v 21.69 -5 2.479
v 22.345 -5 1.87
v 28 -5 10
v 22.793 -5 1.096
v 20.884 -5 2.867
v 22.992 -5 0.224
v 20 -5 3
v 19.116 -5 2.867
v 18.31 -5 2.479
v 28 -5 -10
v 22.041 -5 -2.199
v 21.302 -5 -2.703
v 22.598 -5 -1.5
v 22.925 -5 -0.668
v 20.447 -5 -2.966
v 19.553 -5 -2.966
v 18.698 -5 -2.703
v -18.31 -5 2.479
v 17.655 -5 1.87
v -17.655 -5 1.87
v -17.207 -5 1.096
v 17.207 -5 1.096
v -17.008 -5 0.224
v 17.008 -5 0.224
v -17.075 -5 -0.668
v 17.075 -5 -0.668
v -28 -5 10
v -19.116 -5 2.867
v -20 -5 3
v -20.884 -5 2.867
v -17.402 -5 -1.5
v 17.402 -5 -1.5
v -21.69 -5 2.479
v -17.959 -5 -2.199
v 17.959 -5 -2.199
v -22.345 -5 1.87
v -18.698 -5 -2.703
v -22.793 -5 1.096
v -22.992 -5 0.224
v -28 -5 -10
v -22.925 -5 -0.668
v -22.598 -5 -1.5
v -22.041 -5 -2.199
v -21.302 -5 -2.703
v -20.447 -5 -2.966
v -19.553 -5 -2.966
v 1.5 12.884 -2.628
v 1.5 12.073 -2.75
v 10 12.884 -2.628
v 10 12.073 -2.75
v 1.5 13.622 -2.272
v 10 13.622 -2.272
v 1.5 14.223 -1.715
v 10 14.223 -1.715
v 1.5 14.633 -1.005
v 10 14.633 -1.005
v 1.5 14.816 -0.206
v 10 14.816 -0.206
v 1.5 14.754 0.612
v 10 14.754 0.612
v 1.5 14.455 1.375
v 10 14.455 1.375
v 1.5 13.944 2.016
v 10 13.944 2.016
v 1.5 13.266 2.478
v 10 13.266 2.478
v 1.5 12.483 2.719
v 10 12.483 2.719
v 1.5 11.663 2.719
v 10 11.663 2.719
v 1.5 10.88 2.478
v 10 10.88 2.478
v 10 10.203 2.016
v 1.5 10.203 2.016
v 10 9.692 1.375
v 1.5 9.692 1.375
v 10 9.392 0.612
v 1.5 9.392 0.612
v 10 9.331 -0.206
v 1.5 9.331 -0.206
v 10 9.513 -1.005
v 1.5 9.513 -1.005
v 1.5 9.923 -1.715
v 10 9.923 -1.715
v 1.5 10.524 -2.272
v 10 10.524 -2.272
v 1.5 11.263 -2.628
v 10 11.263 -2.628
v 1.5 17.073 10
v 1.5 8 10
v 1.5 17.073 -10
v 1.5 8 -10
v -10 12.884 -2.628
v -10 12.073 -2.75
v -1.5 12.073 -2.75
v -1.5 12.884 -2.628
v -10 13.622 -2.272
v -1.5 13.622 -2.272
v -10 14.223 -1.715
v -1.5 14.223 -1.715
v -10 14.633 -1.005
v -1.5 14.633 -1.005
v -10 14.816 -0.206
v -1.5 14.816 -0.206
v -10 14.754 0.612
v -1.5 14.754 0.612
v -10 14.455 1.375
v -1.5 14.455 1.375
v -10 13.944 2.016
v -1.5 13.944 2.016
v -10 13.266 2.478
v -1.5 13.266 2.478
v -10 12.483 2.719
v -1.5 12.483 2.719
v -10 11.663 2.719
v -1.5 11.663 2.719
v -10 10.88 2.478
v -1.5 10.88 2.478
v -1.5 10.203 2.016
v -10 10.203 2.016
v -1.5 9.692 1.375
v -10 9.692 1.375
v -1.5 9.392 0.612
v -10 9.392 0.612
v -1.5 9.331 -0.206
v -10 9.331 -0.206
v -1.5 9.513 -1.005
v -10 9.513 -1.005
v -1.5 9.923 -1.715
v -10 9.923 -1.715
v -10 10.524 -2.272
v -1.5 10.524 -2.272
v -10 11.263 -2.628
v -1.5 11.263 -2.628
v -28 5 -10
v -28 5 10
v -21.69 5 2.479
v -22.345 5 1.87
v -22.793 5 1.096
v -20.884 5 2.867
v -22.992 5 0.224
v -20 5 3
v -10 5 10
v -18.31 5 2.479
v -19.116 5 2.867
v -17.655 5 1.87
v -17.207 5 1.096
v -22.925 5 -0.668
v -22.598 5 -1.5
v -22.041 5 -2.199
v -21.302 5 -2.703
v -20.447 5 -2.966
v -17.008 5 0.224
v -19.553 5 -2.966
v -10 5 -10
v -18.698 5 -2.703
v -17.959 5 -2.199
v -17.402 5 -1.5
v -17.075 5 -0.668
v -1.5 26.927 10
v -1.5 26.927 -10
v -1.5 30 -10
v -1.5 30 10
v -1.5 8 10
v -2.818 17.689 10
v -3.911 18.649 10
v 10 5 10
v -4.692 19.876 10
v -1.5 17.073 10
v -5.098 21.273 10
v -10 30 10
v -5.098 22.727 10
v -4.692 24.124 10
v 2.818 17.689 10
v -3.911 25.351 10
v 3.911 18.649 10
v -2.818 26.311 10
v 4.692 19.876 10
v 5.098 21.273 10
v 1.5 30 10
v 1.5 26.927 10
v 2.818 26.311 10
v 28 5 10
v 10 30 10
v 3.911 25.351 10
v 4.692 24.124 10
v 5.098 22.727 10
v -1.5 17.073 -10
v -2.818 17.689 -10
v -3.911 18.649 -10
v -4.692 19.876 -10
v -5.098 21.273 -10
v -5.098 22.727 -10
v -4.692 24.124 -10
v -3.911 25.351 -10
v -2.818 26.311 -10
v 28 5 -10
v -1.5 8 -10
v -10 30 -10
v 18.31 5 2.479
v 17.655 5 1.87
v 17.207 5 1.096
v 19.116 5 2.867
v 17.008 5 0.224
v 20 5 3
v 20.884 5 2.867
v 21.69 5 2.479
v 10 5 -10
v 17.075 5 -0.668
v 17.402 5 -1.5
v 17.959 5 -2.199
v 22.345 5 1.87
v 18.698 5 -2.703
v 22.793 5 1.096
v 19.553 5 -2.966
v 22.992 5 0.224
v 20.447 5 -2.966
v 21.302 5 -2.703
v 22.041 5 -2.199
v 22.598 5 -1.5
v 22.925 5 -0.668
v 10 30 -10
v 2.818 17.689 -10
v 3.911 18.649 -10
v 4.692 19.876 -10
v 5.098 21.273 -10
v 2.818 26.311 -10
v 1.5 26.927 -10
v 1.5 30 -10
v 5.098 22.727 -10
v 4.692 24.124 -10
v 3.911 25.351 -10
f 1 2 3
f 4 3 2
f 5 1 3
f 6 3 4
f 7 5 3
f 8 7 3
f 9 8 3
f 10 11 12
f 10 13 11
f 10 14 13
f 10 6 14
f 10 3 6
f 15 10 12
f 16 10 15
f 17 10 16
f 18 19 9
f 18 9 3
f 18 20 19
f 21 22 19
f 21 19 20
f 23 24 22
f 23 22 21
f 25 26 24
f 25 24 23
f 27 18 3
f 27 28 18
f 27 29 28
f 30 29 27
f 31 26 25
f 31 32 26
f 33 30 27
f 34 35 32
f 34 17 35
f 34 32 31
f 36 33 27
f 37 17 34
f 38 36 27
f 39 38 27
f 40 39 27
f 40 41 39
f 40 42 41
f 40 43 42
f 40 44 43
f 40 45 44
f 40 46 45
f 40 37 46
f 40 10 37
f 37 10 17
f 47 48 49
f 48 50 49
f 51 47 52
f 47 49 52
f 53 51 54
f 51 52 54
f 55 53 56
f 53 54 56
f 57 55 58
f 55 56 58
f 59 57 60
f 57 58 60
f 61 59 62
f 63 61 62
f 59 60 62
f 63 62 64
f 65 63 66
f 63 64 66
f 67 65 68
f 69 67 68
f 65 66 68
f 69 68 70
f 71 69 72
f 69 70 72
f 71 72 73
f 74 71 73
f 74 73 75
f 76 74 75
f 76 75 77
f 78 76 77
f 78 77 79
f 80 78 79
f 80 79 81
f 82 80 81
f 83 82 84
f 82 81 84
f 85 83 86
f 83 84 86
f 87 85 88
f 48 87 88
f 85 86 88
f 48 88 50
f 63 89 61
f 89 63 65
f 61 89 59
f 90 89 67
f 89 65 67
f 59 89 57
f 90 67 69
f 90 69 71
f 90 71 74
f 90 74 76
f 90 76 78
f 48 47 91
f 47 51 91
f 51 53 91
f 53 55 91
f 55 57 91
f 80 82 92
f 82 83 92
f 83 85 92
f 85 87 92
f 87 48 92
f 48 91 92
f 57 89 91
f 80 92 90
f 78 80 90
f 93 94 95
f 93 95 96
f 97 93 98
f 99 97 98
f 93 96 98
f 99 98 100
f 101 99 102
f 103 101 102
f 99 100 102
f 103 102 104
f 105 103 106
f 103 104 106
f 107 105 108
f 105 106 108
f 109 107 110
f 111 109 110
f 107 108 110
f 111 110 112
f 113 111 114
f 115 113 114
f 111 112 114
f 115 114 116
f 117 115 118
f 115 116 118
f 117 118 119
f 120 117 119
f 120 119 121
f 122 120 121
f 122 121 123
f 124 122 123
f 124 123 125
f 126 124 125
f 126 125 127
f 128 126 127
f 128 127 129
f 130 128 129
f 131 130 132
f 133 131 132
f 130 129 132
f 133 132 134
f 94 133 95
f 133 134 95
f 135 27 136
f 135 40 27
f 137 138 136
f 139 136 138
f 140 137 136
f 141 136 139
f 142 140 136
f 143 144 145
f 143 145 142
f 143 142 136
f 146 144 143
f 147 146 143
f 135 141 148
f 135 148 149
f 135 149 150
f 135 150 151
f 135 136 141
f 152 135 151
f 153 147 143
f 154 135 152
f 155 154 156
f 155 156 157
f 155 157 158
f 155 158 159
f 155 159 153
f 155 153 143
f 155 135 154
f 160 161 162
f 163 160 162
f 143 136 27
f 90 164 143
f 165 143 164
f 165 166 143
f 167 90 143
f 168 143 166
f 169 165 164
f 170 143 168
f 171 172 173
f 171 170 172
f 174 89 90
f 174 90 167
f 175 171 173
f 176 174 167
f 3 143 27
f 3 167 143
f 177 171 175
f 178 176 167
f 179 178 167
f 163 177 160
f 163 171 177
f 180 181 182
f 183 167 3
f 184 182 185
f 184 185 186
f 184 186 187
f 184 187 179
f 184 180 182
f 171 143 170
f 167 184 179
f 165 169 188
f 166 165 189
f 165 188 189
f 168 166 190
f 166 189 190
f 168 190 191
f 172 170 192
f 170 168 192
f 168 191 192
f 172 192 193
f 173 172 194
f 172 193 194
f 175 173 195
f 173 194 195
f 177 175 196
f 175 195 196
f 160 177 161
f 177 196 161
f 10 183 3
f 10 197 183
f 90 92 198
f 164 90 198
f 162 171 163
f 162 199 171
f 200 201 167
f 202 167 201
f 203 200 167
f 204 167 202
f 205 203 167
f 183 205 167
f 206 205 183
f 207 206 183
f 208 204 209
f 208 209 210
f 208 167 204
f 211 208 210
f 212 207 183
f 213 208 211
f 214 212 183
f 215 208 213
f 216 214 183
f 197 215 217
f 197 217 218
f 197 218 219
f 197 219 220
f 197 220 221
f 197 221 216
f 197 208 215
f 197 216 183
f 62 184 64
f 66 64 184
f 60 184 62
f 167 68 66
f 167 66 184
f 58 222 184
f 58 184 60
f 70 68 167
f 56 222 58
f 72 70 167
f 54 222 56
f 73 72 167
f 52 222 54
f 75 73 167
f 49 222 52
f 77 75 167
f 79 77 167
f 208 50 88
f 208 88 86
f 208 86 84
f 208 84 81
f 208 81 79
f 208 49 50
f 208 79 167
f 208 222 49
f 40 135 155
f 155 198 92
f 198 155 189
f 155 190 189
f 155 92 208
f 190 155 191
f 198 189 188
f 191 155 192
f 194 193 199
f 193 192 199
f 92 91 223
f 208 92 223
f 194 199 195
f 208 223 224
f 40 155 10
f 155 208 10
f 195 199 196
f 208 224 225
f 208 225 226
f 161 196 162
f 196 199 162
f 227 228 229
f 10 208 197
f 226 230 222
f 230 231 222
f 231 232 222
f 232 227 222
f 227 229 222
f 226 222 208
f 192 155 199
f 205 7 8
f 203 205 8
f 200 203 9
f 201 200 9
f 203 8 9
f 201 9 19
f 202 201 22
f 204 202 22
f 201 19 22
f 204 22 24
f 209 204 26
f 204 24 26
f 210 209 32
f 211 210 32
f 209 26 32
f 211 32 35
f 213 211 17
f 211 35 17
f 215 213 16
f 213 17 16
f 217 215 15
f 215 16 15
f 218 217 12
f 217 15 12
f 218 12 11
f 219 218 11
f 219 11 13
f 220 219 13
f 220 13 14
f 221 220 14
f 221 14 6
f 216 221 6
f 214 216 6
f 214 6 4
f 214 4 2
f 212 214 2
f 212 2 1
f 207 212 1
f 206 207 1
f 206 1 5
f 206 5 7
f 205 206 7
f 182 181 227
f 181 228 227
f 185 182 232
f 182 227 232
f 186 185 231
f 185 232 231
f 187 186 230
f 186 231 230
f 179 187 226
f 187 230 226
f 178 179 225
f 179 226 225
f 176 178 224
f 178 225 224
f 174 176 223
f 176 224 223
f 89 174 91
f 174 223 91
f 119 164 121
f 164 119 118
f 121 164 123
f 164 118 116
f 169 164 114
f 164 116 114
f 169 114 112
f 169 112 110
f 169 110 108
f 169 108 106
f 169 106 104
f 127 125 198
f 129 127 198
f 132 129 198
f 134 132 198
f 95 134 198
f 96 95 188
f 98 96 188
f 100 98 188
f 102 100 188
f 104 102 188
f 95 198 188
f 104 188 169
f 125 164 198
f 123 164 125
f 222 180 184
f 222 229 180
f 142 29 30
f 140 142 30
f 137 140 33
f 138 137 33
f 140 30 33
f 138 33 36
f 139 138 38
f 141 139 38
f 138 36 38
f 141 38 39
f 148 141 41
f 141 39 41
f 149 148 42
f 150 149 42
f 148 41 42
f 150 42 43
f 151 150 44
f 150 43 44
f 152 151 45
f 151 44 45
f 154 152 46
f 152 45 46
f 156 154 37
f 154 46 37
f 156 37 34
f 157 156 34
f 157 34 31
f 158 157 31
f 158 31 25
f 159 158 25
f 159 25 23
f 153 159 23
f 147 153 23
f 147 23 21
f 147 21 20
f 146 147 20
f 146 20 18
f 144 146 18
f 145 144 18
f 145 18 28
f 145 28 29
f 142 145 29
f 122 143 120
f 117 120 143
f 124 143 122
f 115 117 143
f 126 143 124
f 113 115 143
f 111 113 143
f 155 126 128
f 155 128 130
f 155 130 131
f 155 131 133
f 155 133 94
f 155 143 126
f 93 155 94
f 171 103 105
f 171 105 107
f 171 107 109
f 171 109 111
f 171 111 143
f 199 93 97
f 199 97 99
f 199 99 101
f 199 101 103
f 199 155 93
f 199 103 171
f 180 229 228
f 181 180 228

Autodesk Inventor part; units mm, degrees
ref_plane "YZ Plane" through (0, 0, 0) normal (1, 0, 0) x (0, 1, 0)
ref_plane "XZ Plane" through (0, 0, 0) normal (0, 1, 0) x (-1, 0, 0)
ref_plane "XY Plane" through (0, 0, 0) normal (0, 0, 1) x (1, 0, 0)
sketch "Sketch1" plane through (0, 0, 0) normal (0, 0, 1) x (1, 0, 0)
  line L0 (-28, 5) -> (28, 5)
  line L1 (28, 5) -> (28, -5)
  line L2 (28, -5) -> (-28, -5)
  line L3 (-28, -5) -> (-28, 5)
  line L4 (-10, 30) -> (10, 30)
  line L5 (10, 30) -> (10, 5)
  line L6 (10, 5) -> (-10, 5)
  line L7 (-10, 5) -> (-10, 30)
  circle A0 centre (0, 22) radius 5.15
  line L8 (-1.5, 30) -> (1.5, 30)
  line L9 (1.5, 30) -> (1.5, 8)
  line L10 (1.5, 8) -> (-1.5, 8)
  line L11 (-1.5, 8) -> (-1.5, 30)
  point P0 (0, 0)
  point P1 (-28, 0)
  point P2 (0, 5)
  point P3 (0, 30)
  point P4 (0, 30)
  point P5 (-1.5, 17.0733)
  point P6 (-1.5, 26.9267)
  point P7 (-1.5, 30)
  point P8 (-10, 5)
  point P9 (10, 5)
  point P10 (1.5, 30)
  point P11 (1.5, 26.9267)
  point P12 (1.5, 17.0733)
  dimension "d0" = 10
  dimension "d1" = 20
  dimension "d2" = 10.3
  dimension "d3" = 17
  dimension "d4" = 8
  dimension "d5" = 3
  dimension "d6" = 14
  dimension "d7" = 18
extrude "Extrusion1" add sketch "Sketch1" along normal mid plane 20 contours L0 L1 L2 L3 | L7 L4 L11 A0 L10 L9 L5 L0
sketch "Sketch2" plane through (10, 5, 10) normal (0, 1, 0) x (1, 0, 0)
  line L0 (0, 20) -> (18, 20) projected
  line L1 (-38, 20) -> (-20, 20) projected
  line L2 (-38, 20) -> (-38, 0) projected
  line L3 (18, 20) -> (18, 0) projected
  point P0 (-10, 10)
  point P1 (-30, 10)
  point P2 (10, 10)
  point P3 (-38, 10)
  point P4 (18, 10)
  dimension "d25" = 8
  dimension "d26" = 8
hole "Hole1" at (-20, 5, 0) at (20, 5, 0) direction (0, -1, 0) diameter 6 end through all
sketch "Sketch3" plane through (10, 5, 10) normal (1, 0, 0) x (0, 0, -1)
  line L0 (20, 25) -> (0, 25) projected
  circle A0 centre (10, 7.0733) radius 2.75
  line L1 (20, 25) -> (0, 25) projected
  line L2 (0, 25) -> (8, 25)
  line L3 (8, 25) -> (8, 0)
  line L4 (8, 0) -> (0, 0)
  line L5 (0, 0) -> (0, 25)
  line L6 (20, 0) -> (0, 0) projected
  line L7 (12, 25) -> (20, 25)
  line L8 (20, 25) -> (20, 0)
  line L9 (20, 0) -> (12, 0)
  line L10 (12, 0) -> (12, 25)
  line L11 (20, 25) -> (20, 0) projected
  line L12 (20, 12.0733) -> (0, 12.0733) projected
  point P0 (10, -5)
  point P1 (10, 25)
  point P2 (12, 0)
  dimension "d18" = 5.5
  dimension "d19" = 8
  dimension "d21" = 8
  dimension "d24" = 5
extrude "Extrusion2" cut sketch "Sketch3" against normal through all contours L10 A0 L3 | A0 L10 | L3 A0
equation "\"d21\" = d19"
properties part number "0008-10-020 Suport Axa Y"
